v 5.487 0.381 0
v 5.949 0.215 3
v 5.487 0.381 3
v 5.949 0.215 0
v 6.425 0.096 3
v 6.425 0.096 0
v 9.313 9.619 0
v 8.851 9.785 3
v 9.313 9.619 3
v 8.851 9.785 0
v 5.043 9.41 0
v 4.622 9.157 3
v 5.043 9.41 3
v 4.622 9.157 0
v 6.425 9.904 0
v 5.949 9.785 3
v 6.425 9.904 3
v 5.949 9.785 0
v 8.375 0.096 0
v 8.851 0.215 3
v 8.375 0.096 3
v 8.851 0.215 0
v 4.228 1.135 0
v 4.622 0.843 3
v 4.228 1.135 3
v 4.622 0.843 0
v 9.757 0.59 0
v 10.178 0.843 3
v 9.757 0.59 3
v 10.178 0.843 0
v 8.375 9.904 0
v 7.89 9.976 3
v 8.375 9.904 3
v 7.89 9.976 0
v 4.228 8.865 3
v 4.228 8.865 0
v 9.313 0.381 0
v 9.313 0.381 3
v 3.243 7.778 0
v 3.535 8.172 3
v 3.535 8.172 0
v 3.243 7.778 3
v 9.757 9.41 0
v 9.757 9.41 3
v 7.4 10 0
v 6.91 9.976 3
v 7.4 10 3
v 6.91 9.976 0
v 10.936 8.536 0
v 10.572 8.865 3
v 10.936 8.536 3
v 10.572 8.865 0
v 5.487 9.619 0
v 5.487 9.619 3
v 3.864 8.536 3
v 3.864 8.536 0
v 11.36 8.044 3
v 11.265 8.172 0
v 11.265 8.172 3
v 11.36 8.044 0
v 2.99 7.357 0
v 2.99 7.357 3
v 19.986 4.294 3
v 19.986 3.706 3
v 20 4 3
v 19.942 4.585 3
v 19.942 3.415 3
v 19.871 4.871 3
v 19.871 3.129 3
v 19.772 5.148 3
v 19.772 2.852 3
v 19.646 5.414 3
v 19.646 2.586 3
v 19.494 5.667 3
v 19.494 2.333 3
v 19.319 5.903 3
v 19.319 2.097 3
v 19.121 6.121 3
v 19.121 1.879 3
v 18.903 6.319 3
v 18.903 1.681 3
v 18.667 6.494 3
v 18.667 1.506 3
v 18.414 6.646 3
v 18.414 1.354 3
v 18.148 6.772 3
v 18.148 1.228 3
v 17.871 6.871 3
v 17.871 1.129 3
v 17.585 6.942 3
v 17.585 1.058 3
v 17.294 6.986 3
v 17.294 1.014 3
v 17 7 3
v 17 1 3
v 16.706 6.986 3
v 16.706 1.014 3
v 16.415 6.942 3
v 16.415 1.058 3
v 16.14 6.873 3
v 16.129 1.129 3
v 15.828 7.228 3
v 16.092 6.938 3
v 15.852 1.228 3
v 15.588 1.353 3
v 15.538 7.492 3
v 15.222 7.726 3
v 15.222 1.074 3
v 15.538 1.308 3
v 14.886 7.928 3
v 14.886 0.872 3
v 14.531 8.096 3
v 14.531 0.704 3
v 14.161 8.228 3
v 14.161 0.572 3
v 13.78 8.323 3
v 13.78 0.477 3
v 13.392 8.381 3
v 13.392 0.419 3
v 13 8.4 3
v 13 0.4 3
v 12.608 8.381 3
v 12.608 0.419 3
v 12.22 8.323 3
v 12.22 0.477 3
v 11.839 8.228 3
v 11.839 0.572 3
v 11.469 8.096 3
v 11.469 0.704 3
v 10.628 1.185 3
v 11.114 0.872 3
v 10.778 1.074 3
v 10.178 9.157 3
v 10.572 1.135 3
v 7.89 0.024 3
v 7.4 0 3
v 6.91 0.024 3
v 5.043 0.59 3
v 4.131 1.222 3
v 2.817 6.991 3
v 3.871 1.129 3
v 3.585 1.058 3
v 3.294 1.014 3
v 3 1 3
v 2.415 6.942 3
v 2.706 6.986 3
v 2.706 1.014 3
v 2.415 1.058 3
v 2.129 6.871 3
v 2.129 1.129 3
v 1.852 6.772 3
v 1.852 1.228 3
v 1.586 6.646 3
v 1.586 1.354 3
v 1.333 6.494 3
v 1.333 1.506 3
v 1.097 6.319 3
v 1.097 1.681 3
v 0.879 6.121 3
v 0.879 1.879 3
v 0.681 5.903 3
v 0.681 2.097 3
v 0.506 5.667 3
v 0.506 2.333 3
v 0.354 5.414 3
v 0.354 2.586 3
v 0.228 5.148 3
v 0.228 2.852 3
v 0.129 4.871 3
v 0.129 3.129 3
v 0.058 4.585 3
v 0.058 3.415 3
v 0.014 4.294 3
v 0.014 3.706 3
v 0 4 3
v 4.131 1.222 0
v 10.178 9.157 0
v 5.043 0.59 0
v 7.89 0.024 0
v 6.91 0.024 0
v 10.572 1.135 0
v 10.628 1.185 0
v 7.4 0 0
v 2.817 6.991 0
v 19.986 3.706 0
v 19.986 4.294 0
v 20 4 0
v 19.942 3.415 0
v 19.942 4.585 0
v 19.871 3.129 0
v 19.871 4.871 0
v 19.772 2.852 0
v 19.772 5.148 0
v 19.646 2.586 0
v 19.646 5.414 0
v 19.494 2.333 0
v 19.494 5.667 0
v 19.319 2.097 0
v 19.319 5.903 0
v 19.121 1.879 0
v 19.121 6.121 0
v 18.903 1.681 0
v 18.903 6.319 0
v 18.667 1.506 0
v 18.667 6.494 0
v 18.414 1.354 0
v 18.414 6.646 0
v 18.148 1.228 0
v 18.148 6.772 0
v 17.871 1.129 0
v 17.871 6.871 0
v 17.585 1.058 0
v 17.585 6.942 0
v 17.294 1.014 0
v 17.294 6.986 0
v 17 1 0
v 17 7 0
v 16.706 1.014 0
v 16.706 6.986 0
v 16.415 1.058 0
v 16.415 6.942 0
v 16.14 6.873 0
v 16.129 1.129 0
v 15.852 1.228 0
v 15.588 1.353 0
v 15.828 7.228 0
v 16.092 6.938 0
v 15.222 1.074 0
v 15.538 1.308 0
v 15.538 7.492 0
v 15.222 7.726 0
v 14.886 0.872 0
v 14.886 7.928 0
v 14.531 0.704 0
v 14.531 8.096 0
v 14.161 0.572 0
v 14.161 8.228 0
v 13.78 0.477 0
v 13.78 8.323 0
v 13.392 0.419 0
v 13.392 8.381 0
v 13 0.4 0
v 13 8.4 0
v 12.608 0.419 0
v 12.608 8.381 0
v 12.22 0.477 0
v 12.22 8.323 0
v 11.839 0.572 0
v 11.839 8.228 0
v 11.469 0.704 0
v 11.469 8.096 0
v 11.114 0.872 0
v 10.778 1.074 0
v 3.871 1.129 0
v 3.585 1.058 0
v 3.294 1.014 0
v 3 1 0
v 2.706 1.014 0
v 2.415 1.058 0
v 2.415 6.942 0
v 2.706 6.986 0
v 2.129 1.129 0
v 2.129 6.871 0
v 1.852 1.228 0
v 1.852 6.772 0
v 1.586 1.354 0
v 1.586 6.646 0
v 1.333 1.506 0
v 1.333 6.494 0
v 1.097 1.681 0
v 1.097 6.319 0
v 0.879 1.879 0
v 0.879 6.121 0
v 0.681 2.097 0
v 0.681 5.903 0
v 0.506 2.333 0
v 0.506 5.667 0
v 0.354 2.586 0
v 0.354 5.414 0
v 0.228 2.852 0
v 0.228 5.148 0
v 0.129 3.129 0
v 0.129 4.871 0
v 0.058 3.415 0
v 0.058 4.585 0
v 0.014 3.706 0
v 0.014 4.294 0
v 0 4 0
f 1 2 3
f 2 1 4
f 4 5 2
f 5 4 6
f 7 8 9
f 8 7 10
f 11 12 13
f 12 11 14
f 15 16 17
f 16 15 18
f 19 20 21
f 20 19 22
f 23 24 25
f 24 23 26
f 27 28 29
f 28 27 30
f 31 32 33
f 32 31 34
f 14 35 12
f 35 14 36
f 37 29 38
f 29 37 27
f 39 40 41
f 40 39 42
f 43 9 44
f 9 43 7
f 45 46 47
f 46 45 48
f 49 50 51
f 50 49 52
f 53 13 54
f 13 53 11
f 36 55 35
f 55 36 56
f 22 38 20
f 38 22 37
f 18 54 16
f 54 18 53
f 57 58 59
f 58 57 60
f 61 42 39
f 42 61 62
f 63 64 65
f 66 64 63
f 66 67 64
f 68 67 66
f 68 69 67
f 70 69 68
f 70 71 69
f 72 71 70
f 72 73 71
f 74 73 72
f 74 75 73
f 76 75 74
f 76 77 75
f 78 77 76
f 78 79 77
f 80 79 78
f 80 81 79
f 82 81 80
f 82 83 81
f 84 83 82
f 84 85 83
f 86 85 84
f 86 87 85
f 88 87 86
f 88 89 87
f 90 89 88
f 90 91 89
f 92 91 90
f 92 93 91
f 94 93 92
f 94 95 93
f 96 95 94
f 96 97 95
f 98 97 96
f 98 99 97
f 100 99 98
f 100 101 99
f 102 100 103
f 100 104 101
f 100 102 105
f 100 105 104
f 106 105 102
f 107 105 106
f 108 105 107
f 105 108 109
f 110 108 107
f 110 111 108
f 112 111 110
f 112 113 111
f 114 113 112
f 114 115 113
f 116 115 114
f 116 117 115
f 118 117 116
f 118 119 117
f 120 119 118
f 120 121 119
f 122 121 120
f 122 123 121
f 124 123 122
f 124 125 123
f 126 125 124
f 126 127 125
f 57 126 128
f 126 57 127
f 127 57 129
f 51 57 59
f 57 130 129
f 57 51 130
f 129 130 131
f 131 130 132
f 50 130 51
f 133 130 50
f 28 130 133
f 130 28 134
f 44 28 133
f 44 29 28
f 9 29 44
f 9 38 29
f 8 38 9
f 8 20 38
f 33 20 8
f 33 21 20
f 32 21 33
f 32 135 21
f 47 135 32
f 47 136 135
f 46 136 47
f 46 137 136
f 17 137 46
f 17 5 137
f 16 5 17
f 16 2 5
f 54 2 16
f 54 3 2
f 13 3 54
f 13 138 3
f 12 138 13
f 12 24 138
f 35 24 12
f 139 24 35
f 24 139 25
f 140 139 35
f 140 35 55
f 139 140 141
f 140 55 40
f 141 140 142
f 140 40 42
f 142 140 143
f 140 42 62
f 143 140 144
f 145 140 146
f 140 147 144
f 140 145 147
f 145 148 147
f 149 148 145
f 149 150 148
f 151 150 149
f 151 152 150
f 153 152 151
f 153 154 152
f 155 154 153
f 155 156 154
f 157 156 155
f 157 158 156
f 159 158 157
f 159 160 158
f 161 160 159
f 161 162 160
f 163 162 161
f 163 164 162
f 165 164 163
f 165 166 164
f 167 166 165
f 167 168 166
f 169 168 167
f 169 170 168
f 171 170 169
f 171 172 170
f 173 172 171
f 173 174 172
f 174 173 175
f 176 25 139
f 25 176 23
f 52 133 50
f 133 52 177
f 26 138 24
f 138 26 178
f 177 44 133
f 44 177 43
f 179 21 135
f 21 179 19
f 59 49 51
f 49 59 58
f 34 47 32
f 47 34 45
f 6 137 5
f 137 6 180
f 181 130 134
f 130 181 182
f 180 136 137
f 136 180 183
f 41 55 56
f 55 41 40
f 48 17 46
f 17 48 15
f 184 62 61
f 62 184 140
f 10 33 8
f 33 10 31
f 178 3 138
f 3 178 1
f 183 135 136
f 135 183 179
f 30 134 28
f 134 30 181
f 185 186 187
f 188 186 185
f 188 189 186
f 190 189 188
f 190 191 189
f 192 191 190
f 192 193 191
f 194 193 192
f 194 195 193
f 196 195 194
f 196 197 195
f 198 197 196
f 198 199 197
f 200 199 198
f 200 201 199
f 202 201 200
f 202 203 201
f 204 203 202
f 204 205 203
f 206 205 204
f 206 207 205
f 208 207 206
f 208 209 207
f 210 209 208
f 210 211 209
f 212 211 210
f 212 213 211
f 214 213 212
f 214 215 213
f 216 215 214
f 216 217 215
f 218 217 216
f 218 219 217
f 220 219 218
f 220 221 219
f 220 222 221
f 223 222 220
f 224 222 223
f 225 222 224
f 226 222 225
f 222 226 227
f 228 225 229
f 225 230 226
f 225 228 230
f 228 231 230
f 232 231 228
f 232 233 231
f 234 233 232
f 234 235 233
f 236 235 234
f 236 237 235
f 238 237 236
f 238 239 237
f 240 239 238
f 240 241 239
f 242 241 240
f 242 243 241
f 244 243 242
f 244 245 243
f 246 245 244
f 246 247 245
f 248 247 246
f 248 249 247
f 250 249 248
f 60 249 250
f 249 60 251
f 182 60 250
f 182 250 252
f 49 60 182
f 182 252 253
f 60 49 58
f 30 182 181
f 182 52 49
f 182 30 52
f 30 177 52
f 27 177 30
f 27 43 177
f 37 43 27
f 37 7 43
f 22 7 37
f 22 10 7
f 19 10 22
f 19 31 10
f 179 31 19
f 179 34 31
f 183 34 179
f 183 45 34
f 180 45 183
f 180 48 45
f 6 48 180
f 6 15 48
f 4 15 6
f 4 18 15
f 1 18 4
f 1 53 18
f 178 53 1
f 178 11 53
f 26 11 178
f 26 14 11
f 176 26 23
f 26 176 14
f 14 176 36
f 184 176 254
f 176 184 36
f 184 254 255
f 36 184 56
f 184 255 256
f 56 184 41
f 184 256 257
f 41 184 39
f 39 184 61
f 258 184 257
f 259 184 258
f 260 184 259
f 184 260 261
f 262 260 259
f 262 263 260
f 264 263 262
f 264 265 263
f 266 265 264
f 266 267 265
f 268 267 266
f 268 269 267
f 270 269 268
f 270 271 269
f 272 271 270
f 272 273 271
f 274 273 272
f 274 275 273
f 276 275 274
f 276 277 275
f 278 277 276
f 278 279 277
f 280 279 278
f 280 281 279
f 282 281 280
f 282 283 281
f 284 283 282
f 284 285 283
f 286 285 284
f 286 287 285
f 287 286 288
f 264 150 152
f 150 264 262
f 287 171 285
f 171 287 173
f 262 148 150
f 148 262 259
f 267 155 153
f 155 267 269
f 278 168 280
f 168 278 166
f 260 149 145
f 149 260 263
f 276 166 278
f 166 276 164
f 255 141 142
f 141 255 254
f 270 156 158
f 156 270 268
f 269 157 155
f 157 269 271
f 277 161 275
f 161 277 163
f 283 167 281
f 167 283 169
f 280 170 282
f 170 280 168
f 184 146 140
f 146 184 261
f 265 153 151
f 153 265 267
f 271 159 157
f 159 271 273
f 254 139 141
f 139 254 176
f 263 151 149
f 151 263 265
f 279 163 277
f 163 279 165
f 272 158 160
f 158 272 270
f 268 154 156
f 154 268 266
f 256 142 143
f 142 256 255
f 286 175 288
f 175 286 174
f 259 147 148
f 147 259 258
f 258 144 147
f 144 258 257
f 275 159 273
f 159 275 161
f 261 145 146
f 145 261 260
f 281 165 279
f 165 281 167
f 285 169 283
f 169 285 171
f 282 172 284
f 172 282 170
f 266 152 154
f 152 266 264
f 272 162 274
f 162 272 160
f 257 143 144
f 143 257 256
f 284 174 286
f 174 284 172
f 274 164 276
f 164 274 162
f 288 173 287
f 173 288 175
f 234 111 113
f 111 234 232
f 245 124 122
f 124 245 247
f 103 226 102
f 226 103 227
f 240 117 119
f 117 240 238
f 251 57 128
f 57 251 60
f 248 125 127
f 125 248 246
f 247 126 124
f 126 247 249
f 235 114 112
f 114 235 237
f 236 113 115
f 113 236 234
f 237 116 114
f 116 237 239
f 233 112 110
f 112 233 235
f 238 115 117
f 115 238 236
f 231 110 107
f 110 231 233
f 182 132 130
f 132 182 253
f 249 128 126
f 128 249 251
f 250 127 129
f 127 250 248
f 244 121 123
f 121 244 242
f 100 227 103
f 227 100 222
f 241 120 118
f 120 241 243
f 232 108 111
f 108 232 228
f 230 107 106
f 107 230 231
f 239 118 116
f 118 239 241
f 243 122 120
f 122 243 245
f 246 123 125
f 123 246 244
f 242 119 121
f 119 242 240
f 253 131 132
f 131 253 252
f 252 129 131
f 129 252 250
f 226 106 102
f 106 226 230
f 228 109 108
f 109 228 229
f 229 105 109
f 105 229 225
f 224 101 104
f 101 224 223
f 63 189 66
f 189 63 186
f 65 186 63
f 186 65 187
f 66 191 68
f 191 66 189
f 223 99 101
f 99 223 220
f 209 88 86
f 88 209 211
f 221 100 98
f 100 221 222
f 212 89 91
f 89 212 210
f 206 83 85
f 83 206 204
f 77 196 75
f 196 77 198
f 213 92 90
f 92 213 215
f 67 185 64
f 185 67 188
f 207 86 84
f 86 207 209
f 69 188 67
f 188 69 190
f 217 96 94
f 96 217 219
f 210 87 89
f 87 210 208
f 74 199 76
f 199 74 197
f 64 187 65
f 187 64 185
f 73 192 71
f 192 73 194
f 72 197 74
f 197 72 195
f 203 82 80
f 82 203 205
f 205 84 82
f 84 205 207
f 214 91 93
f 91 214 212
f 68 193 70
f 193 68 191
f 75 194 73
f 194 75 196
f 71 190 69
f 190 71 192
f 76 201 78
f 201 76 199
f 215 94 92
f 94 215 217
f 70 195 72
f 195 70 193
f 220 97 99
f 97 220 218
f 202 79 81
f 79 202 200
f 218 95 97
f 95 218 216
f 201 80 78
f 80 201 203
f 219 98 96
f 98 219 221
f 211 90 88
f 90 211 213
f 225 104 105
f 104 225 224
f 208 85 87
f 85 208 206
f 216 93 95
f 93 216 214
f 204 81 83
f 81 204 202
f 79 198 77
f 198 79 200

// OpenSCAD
/*
Makes a cloud object.

parameters:
width		The width of the cloud. This also determine the height, because the height is half the width.
thick		Thickness of the object.
*/

//cloud(100, 10);

module cloud(width, thick){
		translate([width*.37, width*.25, 0]) cylinder(h = thick, r = width*.25);
		translate([width*.15, width*.2, 0]) cylinder(h = thick, r = width*.15);
		translate([width*.65, width*.22, 0]) cylinder(h = thick, r = width*.2);
		translate([width*.85, width*.2, 0]) cylinder(h = thick, r = width*.15);
}//end of module cloud

$fn=64;
cloud(20,3);
